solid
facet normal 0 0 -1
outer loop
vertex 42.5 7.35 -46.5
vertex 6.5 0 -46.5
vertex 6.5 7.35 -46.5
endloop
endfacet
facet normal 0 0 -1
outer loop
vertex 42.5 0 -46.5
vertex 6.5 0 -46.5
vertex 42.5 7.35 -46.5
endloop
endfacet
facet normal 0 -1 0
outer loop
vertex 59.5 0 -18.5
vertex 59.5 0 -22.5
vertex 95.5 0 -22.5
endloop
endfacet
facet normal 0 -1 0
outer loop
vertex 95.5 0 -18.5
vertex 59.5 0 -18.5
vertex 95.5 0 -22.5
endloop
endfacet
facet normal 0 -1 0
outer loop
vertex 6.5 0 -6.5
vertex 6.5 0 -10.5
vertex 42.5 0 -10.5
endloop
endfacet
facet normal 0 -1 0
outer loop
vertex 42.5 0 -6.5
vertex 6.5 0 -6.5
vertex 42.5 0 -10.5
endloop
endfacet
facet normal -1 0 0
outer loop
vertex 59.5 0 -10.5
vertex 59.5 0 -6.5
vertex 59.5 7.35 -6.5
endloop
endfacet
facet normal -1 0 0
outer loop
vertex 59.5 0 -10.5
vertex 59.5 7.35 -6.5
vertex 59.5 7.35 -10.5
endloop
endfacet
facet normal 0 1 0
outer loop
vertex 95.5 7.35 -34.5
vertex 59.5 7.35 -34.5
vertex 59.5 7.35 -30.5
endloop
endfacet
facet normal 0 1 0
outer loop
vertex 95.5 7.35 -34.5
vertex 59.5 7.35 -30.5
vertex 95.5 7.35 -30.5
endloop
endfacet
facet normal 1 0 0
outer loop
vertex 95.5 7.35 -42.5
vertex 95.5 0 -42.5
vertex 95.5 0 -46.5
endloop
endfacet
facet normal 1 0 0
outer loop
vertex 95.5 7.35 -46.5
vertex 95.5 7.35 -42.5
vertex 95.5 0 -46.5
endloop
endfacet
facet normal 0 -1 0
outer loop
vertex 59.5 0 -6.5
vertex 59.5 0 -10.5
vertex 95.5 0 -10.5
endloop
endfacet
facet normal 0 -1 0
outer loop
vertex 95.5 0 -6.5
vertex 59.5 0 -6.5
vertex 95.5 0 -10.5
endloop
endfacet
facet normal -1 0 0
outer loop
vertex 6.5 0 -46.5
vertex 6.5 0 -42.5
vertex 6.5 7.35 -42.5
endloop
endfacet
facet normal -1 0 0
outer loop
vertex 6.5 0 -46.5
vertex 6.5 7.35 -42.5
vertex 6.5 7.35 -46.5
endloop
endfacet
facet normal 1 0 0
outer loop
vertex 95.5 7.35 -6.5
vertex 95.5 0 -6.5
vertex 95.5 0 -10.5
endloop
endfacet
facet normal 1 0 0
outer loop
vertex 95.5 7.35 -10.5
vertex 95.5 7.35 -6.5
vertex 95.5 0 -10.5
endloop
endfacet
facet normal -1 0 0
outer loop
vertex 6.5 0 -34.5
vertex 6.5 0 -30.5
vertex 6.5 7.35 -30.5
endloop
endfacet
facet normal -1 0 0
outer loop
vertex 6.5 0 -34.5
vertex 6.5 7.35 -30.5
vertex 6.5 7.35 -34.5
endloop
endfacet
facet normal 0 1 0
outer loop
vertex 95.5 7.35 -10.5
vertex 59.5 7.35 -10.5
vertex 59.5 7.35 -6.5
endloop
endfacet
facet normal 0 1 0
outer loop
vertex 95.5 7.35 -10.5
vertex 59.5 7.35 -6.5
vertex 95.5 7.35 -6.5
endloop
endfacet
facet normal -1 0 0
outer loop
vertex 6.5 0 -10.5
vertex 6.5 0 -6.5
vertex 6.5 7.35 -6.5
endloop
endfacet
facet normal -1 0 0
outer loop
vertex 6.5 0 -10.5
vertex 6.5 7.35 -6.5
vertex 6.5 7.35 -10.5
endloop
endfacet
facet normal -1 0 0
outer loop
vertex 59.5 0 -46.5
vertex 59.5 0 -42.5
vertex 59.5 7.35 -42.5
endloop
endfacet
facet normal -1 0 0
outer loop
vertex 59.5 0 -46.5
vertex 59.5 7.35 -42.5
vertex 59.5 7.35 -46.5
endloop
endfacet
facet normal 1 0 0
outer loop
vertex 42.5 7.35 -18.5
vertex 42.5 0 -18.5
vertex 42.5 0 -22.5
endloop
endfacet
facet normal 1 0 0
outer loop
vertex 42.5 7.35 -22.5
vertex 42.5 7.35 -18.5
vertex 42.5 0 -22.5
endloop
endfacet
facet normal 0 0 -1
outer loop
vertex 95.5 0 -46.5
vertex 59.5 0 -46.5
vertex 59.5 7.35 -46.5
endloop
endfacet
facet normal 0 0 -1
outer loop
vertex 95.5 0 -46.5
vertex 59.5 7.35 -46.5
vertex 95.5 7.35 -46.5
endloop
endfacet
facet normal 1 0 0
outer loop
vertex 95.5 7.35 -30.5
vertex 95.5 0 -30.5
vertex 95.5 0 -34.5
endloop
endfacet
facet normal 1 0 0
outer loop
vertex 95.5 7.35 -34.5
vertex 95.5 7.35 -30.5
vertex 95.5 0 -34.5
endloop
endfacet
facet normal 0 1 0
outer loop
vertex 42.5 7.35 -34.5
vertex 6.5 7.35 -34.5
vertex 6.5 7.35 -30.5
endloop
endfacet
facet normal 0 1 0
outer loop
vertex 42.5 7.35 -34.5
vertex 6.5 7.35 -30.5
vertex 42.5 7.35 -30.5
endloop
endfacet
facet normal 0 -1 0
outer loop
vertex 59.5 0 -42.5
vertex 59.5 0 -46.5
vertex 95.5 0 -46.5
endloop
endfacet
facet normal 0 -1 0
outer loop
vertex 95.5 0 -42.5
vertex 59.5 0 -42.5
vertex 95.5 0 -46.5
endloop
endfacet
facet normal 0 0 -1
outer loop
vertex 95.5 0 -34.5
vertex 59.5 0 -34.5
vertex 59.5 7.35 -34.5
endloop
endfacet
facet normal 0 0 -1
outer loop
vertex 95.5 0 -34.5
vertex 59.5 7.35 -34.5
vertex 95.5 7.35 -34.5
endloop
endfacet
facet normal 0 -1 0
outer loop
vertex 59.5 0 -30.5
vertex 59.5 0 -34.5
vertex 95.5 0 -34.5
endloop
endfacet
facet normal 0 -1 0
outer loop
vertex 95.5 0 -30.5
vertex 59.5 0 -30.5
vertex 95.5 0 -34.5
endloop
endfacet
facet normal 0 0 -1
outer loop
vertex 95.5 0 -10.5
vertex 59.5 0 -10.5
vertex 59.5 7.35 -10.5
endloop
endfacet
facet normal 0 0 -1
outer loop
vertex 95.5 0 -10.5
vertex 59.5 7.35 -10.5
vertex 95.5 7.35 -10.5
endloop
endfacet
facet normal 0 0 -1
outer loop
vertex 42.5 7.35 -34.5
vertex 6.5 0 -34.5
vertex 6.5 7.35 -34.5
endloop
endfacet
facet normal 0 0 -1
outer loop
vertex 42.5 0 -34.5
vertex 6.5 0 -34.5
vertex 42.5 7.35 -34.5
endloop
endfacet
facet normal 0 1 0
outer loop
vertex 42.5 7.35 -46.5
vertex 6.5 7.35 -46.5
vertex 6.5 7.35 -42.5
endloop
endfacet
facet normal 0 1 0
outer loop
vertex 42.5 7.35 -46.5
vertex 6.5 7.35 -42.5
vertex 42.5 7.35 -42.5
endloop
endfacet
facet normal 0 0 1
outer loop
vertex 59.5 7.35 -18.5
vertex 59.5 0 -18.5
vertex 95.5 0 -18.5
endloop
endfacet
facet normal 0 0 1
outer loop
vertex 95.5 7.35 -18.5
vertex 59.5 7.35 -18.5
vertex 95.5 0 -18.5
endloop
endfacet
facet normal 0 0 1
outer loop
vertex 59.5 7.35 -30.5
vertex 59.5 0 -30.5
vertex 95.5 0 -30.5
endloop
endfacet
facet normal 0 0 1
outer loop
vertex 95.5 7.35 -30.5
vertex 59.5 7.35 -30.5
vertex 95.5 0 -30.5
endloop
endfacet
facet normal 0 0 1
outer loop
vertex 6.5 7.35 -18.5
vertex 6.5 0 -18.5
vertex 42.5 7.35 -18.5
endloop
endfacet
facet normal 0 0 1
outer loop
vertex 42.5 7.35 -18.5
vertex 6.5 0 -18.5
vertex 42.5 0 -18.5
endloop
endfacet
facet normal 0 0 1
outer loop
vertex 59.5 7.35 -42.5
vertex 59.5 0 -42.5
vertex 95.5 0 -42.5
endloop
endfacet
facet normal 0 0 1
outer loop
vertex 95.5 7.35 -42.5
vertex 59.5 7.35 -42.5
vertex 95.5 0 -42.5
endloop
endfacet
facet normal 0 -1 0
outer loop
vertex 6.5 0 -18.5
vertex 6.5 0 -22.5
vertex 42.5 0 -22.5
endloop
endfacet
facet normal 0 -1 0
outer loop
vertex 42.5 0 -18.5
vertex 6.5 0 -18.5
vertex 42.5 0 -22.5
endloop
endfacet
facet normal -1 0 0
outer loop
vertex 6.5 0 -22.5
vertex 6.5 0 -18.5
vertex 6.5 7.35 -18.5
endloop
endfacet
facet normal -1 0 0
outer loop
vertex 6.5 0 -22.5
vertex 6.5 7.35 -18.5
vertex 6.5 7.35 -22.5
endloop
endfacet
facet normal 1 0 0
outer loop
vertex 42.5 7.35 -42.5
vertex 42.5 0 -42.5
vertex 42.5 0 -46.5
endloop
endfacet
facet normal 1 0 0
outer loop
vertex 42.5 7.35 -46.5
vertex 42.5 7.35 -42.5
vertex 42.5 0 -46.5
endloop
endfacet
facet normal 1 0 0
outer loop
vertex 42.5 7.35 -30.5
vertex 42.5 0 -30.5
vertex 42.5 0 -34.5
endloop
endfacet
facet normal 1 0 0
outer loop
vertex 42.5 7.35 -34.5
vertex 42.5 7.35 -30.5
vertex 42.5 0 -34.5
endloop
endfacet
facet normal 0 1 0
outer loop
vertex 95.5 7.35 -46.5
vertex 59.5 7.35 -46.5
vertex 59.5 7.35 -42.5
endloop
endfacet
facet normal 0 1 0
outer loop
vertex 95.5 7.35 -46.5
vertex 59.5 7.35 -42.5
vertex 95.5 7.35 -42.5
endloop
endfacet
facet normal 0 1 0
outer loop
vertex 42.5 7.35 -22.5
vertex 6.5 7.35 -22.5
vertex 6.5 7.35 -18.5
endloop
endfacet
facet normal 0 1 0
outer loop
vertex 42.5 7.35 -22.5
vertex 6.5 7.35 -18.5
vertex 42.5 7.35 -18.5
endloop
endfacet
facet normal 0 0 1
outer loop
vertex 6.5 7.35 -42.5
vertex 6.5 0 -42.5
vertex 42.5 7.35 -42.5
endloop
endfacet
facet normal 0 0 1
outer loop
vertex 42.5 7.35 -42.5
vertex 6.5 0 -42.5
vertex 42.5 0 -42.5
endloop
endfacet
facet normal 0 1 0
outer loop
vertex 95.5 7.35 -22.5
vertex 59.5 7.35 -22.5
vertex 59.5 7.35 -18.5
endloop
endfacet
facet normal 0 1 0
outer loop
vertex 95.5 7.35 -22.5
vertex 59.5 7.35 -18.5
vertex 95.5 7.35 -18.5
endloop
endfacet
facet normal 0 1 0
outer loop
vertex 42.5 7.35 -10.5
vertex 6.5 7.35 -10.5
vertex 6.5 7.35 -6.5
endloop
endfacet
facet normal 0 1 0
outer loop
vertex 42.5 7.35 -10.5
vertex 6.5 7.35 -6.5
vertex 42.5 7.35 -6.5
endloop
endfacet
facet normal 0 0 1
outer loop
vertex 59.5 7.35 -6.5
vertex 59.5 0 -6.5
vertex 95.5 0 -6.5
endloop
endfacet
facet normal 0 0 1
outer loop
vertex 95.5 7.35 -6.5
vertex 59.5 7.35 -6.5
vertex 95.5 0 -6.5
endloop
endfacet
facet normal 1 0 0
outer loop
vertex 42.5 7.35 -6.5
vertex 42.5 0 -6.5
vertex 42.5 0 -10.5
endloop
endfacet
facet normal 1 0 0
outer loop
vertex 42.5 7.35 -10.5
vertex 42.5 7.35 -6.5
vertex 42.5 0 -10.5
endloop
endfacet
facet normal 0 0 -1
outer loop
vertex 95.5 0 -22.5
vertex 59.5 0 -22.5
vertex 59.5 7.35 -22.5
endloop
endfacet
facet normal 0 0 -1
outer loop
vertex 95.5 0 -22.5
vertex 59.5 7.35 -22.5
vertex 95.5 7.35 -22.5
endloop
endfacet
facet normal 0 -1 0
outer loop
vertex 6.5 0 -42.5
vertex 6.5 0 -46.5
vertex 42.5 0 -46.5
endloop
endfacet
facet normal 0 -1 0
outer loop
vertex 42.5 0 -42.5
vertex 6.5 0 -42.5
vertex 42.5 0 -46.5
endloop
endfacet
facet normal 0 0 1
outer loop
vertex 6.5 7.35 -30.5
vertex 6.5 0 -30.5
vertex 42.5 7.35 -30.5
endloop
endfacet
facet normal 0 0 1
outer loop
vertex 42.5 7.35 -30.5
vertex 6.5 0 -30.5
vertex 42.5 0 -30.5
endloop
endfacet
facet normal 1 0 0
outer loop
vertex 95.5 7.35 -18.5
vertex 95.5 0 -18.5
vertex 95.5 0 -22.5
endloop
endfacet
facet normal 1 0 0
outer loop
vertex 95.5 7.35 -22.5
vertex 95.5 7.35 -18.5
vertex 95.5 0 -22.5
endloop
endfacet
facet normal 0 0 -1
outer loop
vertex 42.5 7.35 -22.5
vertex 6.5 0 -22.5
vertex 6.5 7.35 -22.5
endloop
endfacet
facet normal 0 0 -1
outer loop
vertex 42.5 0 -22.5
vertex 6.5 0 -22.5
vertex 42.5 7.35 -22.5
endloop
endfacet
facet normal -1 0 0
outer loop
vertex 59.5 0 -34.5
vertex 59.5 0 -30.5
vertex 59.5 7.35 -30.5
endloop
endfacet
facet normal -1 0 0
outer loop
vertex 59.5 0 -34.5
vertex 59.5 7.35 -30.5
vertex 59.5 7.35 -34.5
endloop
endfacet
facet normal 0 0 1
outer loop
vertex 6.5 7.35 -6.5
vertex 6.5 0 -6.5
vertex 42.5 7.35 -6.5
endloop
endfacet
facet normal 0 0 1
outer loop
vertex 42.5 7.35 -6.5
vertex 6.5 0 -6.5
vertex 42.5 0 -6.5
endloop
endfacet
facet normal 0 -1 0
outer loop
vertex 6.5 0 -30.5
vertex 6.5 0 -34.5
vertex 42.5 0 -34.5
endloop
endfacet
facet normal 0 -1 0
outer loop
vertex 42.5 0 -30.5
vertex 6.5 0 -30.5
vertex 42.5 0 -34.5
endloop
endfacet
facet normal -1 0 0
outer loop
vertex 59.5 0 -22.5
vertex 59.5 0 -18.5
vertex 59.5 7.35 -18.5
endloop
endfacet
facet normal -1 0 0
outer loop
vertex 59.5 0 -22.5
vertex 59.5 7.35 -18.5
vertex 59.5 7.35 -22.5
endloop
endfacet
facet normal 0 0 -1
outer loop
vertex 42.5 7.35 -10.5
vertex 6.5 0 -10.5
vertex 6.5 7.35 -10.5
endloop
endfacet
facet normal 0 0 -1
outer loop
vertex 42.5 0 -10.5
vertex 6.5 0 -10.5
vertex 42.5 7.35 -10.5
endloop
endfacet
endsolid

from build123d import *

# Parameters (mm, degrees)
SKETCH1_W             = 36
SKETCH1_H             = 4
BOSS_EXTRUDE1_DEPTH   = 7.35
BOSS_EXTRUDE1_2_DEPTH = 7.35
BOSS_EXTRUDE1_3_DEPTH = 7.35
BOSS_EXTRUDE1_4_DEPTH = 7.35
BOSS_EXTRUDE1_5_DEPTH = 7.35
BOSS_EXTRUDE1_6_DEPTH = 7.35
BOSS_EXTRUDE1_7_DEPTH = 7.35
BOSS_EXTRUDE1_8_DEPTH = 7.35


with BuildPart() as part:
    # Sketch1 → Boss-Extrude1 (new body)
    with BuildSketch(Plane(origin=(0, 0, 0), x_dir=(1, 0, 0), z_dir=(0, 1, 0))):
        with Locations((24.5, 20.5)):
            Rectangle(SKETCH1_W, SKETCH1_H)
    extrude(amount=BOSS_EXTRUDE1_DEPTH)


with BuildPart() as body_2:
    # Sketch1 → Boss-Extrude1 2 (new body)
    with BuildSketch(Plane(origin=(0, 0, 0), x_dir=(1, 0, 0), z_dir=(0, 1, 0))):
        with Locations((24.5, 8.5)):
            Rectangle(SKETCH1_W, SKETCH1_H)
    extrude(amount=BOSS_EXTRUDE1_2_DEPTH)


with BuildPart() as body_3:
    # Sketch1 → Boss-Extrude1 3 (new body)
    with BuildSketch(Plane(origin=(0, 0, 0), x_dir=(1, 0, 0), z_dir=(0, 1, 0))):
        with Locations((24.5, 32.5)):
            Rectangle(SKETCH1_W, SKETCH1_H)
    extrude(amount=BOSS_EXTRUDE1_3_DEPTH)


with BuildPart() as body_4:
    # Sketch1 → Boss-Extrude1 4 (new body)
    with BuildSketch(Plane(origin=(0, 0, 0), x_dir=(1, 0, 0), z_dir=(0, 1, 0))):
        with Locations((24.5, 44.5)):
            Rectangle(SKETCH1_W, SKETCH1_H)
    extrude(amount=BOSS_EXTRUDE1_4_DEPTH)


with BuildPart() as body_5:
    # Sketch1 → Boss-Extrude1 5 (new body)
    with BuildSketch(Plane(origin=(0, 0, 0), x_dir=(1, 0, 0), z_dir=(0, 1, 0))):
        with Locations((77.5, 8.5)):
            Rectangle(SKETCH1_W, SKETCH1_H)
    extrude(amount=BOSS_EXTRUDE1_5_DEPTH)


with BuildPart() as body_6:
    # Sketch1 → Boss-Extrude1 6 (new body)
    with BuildSketch(Plane(origin=(0, 0, 0), x_dir=(1, 0, 0), z_dir=(0, 1, 0))):
        with Locations((77.5, 20.5)):
            Rectangle(SKETCH1_W, SKETCH1_H)
    extrude(amount=BOSS_EXTRUDE1_6_DEPTH)


with BuildPart() as body_7:
    # Sketch1 → Boss-Extrude1 7 (new body)
    with BuildSketch(Plane(origin=(0, 0, 0), x_dir=(1, 0, 0), z_dir=(0, 1, 0))):
        with Locations((77.5, 32.5)):
            Rectangle(SKETCH1_W, SKETCH1_H)
    extrude(amount=BOSS_EXTRUDE1_7_DEPTH)


with BuildPart() as body_8:
    # Sketch1 → Boss-Extrude1 8 (new body)
    with BuildSketch(Plane(origin=(0, 0, 0), x_dir=(1, 0, 0), z_dir=(0, 1, 0))):
        with Locations((77.5, 44.5)):
            Rectangle(SKETCH1_W, SKETCH1_H)
    extrude(amount=BOSS_EXTRUDE1_8_DEPTH)


solid = Compound([part.part, body_2.part, body_3.part, body_4.part, body_5.part, body_6.part, body_7.part, body_8.part])
